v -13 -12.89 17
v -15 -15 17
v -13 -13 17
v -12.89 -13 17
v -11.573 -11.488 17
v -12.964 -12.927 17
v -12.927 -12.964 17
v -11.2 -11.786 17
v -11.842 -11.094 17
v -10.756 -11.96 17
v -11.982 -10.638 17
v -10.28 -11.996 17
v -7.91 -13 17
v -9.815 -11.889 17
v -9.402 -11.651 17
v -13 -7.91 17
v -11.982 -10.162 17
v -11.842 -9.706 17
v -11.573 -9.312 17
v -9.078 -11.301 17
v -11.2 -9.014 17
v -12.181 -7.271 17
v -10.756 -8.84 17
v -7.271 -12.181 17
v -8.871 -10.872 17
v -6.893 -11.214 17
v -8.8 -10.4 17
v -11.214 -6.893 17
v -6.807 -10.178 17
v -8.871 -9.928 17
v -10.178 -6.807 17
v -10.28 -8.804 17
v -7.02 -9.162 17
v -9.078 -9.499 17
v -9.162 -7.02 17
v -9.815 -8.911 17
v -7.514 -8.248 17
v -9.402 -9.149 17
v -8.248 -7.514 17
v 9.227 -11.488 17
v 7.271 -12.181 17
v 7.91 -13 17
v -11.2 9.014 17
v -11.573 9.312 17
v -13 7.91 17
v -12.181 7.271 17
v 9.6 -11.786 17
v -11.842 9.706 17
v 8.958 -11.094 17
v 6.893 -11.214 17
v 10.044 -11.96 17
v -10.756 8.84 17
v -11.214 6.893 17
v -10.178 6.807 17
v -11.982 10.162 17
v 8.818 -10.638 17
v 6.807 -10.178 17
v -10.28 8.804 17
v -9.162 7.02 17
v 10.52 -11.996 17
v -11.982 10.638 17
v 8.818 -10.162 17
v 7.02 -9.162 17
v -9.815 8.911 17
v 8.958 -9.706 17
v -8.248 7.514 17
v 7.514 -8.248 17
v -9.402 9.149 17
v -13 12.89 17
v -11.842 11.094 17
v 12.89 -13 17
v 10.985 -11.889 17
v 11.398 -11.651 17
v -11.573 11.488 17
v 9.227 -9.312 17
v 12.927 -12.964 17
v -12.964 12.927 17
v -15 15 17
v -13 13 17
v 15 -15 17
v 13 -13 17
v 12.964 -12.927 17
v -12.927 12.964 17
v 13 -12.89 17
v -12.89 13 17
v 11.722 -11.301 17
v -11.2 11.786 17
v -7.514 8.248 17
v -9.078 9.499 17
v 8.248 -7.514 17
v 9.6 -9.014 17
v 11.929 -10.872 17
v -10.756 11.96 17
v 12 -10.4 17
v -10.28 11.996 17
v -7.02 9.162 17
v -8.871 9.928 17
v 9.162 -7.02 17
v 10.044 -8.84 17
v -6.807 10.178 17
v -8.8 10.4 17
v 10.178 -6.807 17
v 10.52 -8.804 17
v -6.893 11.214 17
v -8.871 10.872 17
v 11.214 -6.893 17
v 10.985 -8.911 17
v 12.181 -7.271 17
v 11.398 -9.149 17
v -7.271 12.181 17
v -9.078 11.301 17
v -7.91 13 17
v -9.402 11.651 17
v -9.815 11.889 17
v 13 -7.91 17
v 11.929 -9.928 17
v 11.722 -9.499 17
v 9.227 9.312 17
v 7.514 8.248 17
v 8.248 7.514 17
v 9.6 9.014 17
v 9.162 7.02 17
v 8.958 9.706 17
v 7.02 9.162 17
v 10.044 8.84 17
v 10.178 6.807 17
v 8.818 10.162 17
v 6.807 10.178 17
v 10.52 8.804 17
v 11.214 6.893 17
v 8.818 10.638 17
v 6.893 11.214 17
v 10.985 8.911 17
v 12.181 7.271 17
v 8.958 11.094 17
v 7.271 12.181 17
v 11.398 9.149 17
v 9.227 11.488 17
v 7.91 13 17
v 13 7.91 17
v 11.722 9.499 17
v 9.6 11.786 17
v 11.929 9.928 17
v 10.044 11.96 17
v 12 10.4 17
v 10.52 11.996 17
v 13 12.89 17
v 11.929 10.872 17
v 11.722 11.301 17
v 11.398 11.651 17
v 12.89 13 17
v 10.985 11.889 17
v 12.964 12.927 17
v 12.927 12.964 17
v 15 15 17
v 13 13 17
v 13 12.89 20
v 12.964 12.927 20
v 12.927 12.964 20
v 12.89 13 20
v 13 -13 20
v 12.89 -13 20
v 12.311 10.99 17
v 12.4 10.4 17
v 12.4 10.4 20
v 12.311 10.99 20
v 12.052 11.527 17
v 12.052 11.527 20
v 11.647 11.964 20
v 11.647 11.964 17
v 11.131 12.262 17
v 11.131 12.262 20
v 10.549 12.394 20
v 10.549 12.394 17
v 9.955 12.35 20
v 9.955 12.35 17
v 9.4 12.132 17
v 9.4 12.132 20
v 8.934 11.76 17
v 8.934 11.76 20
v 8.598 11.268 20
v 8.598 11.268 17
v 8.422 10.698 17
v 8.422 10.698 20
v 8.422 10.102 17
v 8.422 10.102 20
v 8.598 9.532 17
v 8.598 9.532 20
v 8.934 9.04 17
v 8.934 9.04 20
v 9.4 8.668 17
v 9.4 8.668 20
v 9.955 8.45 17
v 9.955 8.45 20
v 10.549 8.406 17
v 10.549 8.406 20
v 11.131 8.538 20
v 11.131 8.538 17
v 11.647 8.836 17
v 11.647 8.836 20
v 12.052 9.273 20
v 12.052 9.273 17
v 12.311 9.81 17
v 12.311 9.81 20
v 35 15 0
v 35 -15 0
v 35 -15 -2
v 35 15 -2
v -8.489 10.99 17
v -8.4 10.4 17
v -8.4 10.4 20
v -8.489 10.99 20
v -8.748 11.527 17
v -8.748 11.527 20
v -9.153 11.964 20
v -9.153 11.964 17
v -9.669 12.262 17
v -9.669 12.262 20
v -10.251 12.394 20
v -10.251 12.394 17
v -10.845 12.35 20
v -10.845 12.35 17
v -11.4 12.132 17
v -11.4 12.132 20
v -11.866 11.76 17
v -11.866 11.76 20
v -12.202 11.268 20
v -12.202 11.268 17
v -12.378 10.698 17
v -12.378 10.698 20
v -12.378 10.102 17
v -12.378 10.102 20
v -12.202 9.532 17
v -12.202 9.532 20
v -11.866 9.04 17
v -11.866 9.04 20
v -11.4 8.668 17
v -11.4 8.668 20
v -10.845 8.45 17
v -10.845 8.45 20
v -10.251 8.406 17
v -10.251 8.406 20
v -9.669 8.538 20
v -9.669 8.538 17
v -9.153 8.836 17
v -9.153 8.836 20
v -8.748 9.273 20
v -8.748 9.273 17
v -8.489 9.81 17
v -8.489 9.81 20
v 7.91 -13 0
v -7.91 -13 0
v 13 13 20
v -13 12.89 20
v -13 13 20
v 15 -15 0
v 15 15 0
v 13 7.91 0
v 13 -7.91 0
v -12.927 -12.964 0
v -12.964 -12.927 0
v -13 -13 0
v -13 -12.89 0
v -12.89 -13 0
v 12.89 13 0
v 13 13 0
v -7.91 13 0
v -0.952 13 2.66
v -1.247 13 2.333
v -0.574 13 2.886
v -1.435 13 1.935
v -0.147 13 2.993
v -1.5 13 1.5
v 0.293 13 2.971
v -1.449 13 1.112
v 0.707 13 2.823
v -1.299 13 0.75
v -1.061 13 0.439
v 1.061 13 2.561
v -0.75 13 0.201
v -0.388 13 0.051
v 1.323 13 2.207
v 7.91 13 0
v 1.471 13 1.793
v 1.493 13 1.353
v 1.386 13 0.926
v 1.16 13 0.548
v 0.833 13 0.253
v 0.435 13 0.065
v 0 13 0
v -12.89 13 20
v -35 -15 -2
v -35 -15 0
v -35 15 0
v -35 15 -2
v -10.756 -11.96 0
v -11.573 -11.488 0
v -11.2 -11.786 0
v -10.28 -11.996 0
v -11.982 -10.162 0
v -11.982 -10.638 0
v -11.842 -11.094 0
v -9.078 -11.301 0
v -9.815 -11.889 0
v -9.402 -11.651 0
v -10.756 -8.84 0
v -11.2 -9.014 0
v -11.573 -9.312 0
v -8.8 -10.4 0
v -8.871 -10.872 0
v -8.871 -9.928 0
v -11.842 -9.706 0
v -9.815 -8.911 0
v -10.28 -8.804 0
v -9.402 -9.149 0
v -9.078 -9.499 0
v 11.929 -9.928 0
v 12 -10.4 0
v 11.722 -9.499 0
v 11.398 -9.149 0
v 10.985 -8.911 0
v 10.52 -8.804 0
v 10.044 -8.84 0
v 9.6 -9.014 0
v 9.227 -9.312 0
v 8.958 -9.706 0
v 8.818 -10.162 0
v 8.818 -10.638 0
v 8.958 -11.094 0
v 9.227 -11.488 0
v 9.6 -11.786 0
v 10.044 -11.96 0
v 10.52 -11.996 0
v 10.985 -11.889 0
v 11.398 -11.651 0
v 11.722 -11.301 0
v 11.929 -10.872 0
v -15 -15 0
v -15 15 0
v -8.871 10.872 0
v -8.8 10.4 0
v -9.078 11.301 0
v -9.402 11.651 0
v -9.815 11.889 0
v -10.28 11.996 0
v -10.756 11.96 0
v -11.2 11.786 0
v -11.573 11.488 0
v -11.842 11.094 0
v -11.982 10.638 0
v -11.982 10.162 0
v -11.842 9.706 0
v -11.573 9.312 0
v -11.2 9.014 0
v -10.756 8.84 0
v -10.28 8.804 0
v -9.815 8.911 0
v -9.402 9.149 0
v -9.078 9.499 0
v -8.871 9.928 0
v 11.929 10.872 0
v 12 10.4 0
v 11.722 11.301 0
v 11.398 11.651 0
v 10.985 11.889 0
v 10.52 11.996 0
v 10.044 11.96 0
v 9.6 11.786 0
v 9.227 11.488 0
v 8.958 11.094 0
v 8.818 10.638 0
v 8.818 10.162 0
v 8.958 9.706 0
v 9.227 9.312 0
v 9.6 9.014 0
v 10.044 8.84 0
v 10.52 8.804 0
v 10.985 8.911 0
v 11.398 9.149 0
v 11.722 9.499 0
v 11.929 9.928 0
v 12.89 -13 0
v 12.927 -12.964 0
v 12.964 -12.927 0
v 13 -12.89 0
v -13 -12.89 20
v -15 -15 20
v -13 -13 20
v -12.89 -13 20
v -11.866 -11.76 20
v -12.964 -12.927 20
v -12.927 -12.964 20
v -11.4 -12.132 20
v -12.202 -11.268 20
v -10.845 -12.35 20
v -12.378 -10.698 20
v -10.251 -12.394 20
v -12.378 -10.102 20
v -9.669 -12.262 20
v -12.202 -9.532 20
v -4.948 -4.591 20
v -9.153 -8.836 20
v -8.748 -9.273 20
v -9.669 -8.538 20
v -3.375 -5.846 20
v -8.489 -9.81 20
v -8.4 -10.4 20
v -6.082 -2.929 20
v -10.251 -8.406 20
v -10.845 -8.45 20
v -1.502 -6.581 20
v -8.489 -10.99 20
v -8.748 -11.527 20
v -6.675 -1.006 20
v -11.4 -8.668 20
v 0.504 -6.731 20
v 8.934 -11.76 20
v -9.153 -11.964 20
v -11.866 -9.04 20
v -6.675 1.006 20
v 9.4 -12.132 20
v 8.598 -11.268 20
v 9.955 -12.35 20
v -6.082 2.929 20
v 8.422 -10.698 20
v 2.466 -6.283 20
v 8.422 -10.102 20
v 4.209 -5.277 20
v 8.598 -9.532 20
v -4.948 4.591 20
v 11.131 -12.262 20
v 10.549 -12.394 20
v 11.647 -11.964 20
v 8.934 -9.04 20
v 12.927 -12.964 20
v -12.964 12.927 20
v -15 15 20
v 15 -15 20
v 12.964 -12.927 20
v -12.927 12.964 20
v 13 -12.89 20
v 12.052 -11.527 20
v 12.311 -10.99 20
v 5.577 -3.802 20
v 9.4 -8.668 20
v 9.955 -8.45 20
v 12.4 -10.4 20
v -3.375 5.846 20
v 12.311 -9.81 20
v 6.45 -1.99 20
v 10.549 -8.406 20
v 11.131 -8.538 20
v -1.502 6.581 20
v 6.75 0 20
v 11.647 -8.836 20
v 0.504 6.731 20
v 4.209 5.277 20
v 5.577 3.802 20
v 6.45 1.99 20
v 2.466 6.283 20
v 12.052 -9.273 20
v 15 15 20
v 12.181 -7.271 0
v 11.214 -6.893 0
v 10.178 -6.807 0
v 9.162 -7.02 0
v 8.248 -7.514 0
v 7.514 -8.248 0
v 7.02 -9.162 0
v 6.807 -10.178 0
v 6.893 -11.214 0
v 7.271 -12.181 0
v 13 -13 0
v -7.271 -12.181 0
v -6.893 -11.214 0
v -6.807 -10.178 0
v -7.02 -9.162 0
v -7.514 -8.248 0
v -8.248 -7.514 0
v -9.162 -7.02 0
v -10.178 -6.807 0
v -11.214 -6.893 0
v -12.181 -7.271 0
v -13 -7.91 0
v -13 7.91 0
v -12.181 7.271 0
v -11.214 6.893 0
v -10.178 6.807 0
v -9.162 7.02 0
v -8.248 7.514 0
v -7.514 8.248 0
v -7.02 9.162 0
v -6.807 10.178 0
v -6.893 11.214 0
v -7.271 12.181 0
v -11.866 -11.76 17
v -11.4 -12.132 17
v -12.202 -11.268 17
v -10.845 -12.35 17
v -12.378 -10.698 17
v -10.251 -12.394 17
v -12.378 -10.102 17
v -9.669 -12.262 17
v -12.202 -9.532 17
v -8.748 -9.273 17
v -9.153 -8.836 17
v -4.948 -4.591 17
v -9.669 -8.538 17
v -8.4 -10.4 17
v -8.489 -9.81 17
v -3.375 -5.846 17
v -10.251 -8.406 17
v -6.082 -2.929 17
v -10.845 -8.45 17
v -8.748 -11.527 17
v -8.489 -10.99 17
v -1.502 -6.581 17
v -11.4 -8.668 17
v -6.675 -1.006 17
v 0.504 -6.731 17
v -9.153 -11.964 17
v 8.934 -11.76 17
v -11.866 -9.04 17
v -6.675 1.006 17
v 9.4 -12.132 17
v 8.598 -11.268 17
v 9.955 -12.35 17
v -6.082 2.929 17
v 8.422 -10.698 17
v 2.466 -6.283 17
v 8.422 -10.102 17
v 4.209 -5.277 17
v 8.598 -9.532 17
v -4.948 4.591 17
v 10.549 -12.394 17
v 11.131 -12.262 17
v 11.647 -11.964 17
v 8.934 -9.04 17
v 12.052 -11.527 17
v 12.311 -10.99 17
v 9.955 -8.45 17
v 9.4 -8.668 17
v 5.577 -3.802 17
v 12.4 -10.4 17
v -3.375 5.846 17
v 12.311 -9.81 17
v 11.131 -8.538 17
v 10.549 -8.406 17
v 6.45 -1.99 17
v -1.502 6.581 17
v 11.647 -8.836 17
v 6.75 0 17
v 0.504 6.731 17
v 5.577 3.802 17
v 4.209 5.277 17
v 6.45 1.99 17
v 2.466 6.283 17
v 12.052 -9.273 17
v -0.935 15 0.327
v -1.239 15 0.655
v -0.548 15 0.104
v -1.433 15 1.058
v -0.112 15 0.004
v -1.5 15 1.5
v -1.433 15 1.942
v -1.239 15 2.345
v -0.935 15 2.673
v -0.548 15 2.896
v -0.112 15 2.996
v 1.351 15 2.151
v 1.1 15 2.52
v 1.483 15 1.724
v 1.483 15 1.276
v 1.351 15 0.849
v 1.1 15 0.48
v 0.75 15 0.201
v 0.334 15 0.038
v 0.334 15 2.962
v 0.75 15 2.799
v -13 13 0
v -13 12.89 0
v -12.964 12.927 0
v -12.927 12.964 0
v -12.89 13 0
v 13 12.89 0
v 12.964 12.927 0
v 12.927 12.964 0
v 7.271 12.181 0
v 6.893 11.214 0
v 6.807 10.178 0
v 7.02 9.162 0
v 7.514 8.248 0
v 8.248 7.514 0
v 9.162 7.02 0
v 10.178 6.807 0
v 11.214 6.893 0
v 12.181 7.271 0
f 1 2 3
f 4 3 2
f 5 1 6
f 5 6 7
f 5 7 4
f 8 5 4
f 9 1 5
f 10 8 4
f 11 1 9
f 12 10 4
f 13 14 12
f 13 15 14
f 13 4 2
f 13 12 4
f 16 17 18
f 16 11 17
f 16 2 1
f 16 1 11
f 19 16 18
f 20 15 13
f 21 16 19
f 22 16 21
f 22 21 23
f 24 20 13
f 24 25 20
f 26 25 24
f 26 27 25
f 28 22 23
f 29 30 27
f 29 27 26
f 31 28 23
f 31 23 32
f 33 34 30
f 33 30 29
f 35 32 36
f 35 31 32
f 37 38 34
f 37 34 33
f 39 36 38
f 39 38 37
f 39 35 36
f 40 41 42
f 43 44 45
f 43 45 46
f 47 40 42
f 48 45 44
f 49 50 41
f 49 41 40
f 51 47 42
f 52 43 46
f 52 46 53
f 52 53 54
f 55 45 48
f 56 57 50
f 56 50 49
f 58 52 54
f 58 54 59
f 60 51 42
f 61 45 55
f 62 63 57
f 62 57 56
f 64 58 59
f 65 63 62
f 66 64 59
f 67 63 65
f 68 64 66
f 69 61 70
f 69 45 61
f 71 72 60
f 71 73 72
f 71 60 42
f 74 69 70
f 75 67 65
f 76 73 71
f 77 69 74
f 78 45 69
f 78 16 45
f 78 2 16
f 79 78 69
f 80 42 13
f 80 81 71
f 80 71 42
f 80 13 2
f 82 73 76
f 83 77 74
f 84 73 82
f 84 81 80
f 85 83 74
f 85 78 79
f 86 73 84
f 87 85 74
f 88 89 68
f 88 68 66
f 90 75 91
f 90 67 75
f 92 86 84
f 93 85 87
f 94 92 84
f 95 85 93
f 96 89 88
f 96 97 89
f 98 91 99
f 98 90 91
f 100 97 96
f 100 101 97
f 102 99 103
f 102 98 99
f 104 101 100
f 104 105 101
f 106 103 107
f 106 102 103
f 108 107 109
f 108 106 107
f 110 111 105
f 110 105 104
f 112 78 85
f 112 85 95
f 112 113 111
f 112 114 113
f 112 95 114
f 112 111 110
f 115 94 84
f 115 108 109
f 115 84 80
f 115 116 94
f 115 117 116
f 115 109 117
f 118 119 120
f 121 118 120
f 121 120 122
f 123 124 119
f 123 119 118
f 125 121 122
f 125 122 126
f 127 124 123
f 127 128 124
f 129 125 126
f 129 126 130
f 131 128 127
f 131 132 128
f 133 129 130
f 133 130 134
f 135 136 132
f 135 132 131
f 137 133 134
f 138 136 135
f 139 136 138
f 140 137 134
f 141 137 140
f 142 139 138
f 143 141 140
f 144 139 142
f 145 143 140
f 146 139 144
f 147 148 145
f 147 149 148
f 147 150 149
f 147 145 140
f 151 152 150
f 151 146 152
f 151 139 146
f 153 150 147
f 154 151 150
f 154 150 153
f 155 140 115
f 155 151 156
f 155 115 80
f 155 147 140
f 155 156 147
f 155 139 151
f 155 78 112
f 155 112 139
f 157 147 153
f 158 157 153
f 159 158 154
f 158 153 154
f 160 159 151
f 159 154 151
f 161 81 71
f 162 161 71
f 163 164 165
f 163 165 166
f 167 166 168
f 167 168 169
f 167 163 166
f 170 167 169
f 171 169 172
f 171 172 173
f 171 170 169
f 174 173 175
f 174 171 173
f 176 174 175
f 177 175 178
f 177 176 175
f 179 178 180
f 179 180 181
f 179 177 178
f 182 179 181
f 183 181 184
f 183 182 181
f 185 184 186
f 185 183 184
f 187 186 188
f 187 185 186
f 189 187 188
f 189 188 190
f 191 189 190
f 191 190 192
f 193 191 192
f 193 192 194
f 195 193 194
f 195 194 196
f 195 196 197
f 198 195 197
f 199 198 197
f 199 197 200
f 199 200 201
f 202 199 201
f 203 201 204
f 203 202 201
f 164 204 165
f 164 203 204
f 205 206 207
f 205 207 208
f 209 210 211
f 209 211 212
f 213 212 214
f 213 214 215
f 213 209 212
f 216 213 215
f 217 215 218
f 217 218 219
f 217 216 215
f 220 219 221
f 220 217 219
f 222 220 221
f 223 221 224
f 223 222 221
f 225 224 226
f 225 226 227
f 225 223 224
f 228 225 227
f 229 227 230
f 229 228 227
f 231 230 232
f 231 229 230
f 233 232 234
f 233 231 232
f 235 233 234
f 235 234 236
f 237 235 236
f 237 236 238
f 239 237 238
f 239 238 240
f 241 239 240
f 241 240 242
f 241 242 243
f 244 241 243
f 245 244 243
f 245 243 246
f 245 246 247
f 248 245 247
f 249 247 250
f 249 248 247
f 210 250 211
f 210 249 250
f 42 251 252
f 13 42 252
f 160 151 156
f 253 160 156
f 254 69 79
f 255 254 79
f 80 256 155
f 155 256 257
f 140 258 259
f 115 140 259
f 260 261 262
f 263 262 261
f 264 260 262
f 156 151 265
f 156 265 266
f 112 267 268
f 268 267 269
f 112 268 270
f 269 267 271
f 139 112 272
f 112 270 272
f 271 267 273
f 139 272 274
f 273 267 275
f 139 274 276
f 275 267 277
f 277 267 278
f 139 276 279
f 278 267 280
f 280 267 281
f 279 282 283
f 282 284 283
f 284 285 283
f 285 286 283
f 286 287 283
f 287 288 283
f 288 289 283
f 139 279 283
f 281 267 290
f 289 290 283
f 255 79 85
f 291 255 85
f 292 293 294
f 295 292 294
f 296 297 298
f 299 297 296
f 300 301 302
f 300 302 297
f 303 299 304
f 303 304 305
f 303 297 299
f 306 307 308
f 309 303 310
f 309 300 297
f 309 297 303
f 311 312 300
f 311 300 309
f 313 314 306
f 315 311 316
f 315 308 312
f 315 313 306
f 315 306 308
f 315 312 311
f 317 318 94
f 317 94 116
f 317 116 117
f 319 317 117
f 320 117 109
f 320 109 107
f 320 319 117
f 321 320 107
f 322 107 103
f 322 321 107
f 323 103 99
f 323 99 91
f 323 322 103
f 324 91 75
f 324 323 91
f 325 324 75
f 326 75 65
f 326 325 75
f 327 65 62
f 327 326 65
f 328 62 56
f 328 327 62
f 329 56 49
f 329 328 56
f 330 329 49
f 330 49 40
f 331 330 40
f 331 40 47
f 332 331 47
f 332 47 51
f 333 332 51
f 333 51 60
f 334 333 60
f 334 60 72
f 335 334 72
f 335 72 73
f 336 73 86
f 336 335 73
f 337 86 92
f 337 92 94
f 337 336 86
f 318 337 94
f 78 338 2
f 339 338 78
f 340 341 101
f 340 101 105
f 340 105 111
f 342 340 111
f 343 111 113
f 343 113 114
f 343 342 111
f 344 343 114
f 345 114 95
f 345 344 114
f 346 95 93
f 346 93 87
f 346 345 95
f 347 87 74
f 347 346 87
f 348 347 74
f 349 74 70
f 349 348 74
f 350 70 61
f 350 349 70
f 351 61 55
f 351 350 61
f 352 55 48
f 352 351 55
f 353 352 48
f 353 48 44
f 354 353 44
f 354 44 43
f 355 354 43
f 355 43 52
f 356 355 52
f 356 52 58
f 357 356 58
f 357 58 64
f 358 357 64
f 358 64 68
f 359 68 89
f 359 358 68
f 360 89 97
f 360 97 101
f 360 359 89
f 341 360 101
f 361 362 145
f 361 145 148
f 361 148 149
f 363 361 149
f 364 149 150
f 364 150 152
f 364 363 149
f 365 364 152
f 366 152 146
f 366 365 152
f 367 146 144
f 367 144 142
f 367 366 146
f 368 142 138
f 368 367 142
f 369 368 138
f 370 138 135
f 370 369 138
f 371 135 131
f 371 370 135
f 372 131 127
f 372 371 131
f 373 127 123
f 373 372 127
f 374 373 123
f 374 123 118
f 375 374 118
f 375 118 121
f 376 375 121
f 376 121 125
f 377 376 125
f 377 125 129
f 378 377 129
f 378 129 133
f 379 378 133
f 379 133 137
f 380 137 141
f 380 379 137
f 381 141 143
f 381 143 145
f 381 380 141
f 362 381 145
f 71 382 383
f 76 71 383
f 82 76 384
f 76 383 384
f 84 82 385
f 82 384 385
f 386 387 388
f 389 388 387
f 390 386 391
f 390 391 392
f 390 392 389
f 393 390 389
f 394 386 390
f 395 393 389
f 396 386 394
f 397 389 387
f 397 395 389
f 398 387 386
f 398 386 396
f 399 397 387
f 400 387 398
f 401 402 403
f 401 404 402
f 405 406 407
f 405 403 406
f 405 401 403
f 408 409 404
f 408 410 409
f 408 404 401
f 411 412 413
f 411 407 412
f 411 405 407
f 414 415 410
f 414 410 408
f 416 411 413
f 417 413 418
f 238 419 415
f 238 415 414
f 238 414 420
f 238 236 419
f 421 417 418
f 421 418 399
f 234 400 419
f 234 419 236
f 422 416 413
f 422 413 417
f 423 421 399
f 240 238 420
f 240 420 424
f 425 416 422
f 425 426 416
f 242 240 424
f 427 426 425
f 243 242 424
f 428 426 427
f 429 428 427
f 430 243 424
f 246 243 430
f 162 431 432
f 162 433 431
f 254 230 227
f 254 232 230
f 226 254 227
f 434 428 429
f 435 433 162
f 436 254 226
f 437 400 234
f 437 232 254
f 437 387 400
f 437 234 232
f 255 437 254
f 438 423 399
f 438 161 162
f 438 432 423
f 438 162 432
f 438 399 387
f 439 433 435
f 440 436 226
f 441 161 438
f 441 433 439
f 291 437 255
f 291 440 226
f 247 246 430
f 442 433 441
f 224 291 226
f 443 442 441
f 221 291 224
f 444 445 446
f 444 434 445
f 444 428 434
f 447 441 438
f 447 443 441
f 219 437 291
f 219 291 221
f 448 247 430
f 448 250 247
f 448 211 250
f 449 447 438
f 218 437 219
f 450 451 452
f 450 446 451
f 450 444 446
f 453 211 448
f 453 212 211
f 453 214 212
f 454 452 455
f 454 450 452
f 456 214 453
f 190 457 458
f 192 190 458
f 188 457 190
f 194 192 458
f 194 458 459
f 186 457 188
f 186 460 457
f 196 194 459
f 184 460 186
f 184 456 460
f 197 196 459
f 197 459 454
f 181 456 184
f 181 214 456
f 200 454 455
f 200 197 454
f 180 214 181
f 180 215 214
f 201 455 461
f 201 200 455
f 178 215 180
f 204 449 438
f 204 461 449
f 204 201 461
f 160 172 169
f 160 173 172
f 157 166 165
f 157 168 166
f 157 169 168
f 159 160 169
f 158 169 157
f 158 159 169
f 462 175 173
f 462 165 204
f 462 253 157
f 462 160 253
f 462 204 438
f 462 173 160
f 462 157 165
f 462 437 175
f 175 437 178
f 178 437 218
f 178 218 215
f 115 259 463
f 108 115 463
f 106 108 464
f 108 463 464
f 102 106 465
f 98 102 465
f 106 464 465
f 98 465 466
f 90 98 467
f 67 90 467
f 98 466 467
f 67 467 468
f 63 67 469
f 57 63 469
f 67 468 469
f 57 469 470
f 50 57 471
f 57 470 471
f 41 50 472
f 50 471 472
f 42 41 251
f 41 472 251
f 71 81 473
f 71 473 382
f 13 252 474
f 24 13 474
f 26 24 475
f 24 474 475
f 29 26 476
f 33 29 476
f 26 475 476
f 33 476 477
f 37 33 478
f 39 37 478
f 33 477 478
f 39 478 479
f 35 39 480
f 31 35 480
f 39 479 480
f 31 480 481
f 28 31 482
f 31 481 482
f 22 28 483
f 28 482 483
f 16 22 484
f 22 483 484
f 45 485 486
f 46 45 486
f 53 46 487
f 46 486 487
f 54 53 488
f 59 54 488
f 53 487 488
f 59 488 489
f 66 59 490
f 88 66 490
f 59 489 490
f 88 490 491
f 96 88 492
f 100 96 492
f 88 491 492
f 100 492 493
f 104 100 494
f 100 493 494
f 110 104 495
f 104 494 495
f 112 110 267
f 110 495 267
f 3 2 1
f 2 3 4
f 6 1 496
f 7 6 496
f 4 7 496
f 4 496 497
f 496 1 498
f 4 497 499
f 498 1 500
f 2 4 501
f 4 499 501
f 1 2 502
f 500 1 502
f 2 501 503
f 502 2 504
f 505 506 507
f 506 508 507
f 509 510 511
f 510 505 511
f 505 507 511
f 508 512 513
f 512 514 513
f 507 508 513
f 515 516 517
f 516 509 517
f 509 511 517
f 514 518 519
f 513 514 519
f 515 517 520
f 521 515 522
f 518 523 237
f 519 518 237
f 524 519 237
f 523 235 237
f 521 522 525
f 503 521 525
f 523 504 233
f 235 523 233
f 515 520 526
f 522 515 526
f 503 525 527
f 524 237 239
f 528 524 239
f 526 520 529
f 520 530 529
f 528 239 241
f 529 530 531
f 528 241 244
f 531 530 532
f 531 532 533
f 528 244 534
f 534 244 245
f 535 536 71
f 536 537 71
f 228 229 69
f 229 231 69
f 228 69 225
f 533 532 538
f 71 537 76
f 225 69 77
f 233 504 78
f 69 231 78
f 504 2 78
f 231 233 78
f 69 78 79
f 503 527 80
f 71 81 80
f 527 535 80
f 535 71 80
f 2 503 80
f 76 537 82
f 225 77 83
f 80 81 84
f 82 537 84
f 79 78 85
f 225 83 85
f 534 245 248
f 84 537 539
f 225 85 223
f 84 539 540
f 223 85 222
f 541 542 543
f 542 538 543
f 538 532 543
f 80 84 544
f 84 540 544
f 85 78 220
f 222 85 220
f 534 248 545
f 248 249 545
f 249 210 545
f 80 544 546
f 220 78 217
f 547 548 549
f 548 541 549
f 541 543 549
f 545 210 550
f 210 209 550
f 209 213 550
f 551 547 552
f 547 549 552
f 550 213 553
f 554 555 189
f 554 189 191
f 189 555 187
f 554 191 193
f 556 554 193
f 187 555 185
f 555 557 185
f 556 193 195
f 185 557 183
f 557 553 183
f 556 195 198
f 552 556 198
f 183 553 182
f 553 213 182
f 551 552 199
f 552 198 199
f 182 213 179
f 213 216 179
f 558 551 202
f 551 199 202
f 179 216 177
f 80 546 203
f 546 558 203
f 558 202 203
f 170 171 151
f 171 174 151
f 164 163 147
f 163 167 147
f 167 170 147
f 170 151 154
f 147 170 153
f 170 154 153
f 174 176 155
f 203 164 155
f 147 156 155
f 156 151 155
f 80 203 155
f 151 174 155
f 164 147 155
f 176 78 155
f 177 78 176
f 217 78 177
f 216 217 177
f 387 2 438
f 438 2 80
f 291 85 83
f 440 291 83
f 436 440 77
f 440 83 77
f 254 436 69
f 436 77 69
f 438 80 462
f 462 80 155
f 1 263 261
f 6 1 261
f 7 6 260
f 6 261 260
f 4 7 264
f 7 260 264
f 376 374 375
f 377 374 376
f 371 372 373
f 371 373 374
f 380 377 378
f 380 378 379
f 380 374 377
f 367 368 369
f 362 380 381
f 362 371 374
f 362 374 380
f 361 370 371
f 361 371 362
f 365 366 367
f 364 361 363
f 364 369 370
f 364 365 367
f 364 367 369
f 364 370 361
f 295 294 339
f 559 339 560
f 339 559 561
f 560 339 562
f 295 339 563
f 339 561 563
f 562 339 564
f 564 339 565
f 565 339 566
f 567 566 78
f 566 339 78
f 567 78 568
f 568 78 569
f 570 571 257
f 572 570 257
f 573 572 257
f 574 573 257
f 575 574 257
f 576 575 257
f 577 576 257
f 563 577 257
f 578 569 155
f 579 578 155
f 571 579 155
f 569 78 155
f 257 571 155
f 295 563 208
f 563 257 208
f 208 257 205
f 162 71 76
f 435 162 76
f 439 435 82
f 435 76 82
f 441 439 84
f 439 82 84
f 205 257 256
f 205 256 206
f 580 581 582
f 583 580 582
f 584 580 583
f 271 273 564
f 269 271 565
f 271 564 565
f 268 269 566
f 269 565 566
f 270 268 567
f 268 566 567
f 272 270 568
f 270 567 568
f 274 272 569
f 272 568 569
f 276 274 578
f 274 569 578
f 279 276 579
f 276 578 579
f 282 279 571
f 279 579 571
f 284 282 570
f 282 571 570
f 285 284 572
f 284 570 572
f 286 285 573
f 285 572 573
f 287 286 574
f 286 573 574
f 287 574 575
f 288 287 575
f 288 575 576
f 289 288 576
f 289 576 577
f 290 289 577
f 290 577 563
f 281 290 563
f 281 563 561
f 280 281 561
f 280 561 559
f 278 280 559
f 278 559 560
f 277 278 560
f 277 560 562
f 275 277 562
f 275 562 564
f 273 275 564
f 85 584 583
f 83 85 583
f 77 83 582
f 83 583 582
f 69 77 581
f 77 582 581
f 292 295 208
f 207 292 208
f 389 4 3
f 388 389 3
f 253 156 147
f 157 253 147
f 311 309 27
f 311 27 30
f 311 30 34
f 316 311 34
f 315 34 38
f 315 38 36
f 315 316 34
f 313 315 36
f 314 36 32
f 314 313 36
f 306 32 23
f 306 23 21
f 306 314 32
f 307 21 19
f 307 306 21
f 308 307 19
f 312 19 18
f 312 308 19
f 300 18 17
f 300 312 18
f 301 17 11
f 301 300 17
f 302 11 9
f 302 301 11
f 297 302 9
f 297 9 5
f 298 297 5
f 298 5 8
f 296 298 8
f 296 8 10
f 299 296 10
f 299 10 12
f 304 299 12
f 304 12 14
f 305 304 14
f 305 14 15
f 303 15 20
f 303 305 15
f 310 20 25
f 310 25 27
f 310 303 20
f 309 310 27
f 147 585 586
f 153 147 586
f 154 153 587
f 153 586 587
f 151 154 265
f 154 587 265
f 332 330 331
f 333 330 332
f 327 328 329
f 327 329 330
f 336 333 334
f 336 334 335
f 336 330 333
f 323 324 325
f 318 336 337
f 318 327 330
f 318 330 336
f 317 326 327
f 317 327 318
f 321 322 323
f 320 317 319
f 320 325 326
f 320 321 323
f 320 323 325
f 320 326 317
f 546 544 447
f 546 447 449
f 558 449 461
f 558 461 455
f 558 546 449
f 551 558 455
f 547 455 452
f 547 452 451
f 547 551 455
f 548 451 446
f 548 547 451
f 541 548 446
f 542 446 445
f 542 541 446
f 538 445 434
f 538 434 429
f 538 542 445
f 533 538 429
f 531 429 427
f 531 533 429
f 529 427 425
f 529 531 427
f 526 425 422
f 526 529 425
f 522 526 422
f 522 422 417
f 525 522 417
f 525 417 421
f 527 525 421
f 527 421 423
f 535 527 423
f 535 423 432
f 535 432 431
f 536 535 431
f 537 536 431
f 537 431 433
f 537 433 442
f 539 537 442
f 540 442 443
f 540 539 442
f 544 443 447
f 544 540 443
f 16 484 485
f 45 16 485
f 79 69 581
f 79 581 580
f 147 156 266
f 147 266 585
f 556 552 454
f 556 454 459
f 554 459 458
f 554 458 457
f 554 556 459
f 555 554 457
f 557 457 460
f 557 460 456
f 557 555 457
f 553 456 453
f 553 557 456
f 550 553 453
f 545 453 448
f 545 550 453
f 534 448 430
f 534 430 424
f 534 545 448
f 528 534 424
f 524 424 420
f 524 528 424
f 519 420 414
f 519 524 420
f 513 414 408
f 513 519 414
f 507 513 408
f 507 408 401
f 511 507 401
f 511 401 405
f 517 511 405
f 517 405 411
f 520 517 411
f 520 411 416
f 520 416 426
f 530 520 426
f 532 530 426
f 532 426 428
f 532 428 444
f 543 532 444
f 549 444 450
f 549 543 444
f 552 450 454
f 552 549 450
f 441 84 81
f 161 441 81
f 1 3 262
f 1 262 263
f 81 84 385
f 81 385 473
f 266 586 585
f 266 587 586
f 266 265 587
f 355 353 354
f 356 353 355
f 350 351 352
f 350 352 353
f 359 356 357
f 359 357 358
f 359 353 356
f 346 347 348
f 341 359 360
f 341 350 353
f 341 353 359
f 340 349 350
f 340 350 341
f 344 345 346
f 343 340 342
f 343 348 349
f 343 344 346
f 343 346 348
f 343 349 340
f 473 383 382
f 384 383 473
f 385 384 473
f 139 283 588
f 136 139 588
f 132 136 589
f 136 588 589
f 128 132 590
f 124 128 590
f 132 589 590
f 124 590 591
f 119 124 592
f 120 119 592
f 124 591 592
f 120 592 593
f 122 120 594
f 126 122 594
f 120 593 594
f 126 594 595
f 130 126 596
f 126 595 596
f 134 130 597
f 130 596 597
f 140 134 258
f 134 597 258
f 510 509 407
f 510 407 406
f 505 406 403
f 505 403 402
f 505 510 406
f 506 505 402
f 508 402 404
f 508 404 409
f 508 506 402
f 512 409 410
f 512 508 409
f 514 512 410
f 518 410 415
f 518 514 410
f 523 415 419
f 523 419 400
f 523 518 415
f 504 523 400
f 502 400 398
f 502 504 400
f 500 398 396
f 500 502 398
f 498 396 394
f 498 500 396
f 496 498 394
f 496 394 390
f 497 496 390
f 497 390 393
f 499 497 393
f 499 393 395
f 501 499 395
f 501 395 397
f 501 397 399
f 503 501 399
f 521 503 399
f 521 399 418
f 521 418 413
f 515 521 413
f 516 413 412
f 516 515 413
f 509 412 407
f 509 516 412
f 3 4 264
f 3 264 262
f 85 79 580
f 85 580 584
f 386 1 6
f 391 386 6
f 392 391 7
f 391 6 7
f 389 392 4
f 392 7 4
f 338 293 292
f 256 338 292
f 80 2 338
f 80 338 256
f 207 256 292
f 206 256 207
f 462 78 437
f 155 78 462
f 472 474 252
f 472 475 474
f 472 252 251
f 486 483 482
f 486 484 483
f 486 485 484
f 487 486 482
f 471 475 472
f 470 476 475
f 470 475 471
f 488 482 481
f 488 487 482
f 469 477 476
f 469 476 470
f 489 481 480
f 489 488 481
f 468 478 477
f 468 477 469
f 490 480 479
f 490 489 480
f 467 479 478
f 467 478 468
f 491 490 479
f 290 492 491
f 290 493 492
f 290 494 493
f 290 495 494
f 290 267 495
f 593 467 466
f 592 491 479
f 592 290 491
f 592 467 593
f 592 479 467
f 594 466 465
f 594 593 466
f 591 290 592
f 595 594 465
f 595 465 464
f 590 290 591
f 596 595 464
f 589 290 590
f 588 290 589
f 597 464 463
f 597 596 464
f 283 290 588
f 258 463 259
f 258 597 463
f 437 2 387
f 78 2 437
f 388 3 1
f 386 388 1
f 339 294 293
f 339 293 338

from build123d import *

# Parameters (mm, degrees)
F0_W     = 70
F0_H     = 30
F1_DEPTH = 2
F2_W     = 30
F2_H     = 30
F2_R     = 1.6
F3_DEPTH = 17
F4_W     = 30
F4_H     = 30
F4_R     = 2
F4_R_2   = 6.75
F5_DEPTH = 3
F6_R     = 1.5
F7_DEPTH = 2


with BuildPart() as f1:
    # F0 (on Top) → F1 (new body)
    with BuildSketch(Plane.XY):
        Rectangle(F0_W, F0_H)
    extrude(amount=-F1_DEPTH)

    # F2 (on face) → F3 (join)
    with BuildSketch(Plane.XY):
        Rectangle(F2_W, F2_H)
        with BuildLine():
            Line((-12.88998, -13), (-13, -13))
            Line((-13, -13), (-13, -12.88998))
            ThreePointArc((-13, -12.88998), (-12.945584, -12.945584), (-12.88998, -13))
        make_face(mode=Mode.SUBTRACT)
        with Locations((-10.4, -10.4)):
            Circle(F2_R, mode=Mode.SUBTRACT)
        with BuildLine():
            Line((13, -12.88998), (13, -13))
            Line((13, -13), (12.88998, -13))
            ThreePointArc((12.88998, -13), (12.945584, -12.945584), (13, -12.88998))
        make_face(mode=Mode.SUBTRACT)
        with Locations((10.4, -10.4)):
            Circle(F2_R, mode=Mode.SUBTRACT)
        with Locations((-10.4, 10.4)):
            Circle(F2_R, mode=Mode.SUBTRACT)
        with BuildLine():
            Line((-13, 13), (-12.88998, 13))
            ThreePointArc((-12.88998, 13), (-12.945584, 12.945584), (-13, 12.88998))
            Line((-13, 12.88998), (-13, 13))
        make_face(mode=Mode.SUBTRACT)
        with BuildLine():
            Line((-13, -7.91002), (-13, 7.91002))
            ThreePointArc((-13, 7.91002), (-7.854416, 7.854416), (-7.91002, 13))
            Line((-7.91002, 13), (7.91002, 13))
            ThreePointArc((7.91002, 13), (7.854416, 7.854416), (13, 7.91002))
            Line((13, 7.91002), (13, -7.91002))
            ThreePointArc((13, -7.91002), (7.854416, -7.854416), (7.91002, -13))
            Line((7.91002, -13), (-7.91002, -13))
            ThreePointArc((-7.91002, -13), (-7.854416, -7.854416), (-13, -7.91002))
        make_face(mode=Mode.SUBTRACT)
        with Locations((10.4, 10.4)):
            Circle(F2_R, mode=Mode.SUBTRACT)
        with BuildLine():
            Line((12.88998, 13), (13, 13))
            Line((13, 13), (13, 12.88998))
            ThreePointArc((13, 12.88998), (12.945584, 12.945584), (12.88998, 13))
        make_face(mode=Mode.SUBTRACT)
    extrude(amount=F3_DEPTH)

    # F6 (on face) → F7 (cut, through all)
    with BuildSketch(Plane(origin=(0, 15, 0), x_dir=(-1, 0, 0), z_dir=(0, 1, 0))):
        with Locations((0, 1.5)):
            Circle(F6_R)
    extrude(amount=-F7_DEPTH, mode=Mode.SUBTRACT)


with BuildPart() as f5:
    # F4 (on face) → F5 (new body)
    with BuildSketch(Plane.XY.offset(17)):
        Rectangle(F4_W, F4_H)
        with BuildLine():
            ThreePointArc((-13, -12.88998), (-12.945584, -12.945584), (-12.88998, -13))
            Line((-12.88998, -13), (-13, -13))
            Line((-13, -13), (-13, -12.88998))
        make_face(mode=Mode.SUBTRACT)
        with Locations((-10.4, -10.4)):
            Circle(F4_R, mode=Mode.SUBTRACT)
        with BuildLine():
            ThreePointArc((12.88998, -13), (12.945584, -12.945584), (13, -12.88998))
            Line((13, -12.88998), (13, -13))
            Line((13, -13), (12.88998, -13))
        make_face(mode=Mode.SUBTRACT)
        with Locations((10.4, -10.4)):
            Circle(F4_R, mode=Mode.SUBTRACT)
        with Locations((-10.4, 10.4)):
            Circle(F4_R, mode=Mode.SUBTRACT)
        with BuildLine():
            ThreePointArc((-12.88998, 13), (-12.945584, 12.945584), (-13, 12.88998))
            Line((-13, 12.88998), (-13, 13))
            Line((-13, 13), (-12.88998, 13))
        make_face(mode=Mode.SUBTRACT)
        with BuildLine():
            ThreePointArc((-7.91002, -13), (-7.854416, -7.854416), (-13, -7.91002))
            Line((-13, -7.91002), (-13, 7.91002))
            ThreePointArc((-13, 7.91002), (-7.854416, 7.854416), (-7.91002, 13))
            Line((-7.91002, 13), (7.91002, 13))
            ThreePointArc((7.91002, 13), (7.854416, 7.854416), (13, 7.91002))
            Line((13, 7.91002), (13, -7.91002))
            ThreePointArc((13, -7.91002), (7.854416, -7.854416), (7.91002, -13))
            Line((7.91002, -13), (-7.91002, -13))
        make_face(mode=Mode.SUBTRACT)
        with Locations((10.4, 10.4)):
            Circle(F4_R, mode=Mode.SUBTRACT)
        with BuildLine():
            ThreePointArc((13, 12.88998), (12.945584, 12.945584), (12.88998, 13))
            Line((12.88998, 13), (13, 13))
            Line((13, 13), (13, 12.88998))
        make_face(mode=Mode.SUBTRACT)
        with BuildLine():
            Line((-13, 7.91002), (-13, -7.91002))
            ThreePointArc((-13, -7.91002), (-7.854416, -7.854416), (-7.91002, -13))
            Line((-7.91002, -13), (7.91002, -13))
            ThreePointArc((7.91002, -13), (7.854416, -7.854416), (13, -7.91002))
            Line((13, -7.91002), (13, 7.91002))
            ThreePointArc((13, 7.91002), (7.854416, 7.854416), (7.91002, 13))
            Line((7.91002, 13), (-7.91002, 13))
            ThreePointArc((-7.91002, 13), (-7.854416, 7.854416), (-13, 7.91002))
        make_face()
        Circle(F4_R_2, mode=Mode.SUBTRACT)
    extrude(amount=F5_DEPTH)


solid = Compound([f1.part, f5.part])
